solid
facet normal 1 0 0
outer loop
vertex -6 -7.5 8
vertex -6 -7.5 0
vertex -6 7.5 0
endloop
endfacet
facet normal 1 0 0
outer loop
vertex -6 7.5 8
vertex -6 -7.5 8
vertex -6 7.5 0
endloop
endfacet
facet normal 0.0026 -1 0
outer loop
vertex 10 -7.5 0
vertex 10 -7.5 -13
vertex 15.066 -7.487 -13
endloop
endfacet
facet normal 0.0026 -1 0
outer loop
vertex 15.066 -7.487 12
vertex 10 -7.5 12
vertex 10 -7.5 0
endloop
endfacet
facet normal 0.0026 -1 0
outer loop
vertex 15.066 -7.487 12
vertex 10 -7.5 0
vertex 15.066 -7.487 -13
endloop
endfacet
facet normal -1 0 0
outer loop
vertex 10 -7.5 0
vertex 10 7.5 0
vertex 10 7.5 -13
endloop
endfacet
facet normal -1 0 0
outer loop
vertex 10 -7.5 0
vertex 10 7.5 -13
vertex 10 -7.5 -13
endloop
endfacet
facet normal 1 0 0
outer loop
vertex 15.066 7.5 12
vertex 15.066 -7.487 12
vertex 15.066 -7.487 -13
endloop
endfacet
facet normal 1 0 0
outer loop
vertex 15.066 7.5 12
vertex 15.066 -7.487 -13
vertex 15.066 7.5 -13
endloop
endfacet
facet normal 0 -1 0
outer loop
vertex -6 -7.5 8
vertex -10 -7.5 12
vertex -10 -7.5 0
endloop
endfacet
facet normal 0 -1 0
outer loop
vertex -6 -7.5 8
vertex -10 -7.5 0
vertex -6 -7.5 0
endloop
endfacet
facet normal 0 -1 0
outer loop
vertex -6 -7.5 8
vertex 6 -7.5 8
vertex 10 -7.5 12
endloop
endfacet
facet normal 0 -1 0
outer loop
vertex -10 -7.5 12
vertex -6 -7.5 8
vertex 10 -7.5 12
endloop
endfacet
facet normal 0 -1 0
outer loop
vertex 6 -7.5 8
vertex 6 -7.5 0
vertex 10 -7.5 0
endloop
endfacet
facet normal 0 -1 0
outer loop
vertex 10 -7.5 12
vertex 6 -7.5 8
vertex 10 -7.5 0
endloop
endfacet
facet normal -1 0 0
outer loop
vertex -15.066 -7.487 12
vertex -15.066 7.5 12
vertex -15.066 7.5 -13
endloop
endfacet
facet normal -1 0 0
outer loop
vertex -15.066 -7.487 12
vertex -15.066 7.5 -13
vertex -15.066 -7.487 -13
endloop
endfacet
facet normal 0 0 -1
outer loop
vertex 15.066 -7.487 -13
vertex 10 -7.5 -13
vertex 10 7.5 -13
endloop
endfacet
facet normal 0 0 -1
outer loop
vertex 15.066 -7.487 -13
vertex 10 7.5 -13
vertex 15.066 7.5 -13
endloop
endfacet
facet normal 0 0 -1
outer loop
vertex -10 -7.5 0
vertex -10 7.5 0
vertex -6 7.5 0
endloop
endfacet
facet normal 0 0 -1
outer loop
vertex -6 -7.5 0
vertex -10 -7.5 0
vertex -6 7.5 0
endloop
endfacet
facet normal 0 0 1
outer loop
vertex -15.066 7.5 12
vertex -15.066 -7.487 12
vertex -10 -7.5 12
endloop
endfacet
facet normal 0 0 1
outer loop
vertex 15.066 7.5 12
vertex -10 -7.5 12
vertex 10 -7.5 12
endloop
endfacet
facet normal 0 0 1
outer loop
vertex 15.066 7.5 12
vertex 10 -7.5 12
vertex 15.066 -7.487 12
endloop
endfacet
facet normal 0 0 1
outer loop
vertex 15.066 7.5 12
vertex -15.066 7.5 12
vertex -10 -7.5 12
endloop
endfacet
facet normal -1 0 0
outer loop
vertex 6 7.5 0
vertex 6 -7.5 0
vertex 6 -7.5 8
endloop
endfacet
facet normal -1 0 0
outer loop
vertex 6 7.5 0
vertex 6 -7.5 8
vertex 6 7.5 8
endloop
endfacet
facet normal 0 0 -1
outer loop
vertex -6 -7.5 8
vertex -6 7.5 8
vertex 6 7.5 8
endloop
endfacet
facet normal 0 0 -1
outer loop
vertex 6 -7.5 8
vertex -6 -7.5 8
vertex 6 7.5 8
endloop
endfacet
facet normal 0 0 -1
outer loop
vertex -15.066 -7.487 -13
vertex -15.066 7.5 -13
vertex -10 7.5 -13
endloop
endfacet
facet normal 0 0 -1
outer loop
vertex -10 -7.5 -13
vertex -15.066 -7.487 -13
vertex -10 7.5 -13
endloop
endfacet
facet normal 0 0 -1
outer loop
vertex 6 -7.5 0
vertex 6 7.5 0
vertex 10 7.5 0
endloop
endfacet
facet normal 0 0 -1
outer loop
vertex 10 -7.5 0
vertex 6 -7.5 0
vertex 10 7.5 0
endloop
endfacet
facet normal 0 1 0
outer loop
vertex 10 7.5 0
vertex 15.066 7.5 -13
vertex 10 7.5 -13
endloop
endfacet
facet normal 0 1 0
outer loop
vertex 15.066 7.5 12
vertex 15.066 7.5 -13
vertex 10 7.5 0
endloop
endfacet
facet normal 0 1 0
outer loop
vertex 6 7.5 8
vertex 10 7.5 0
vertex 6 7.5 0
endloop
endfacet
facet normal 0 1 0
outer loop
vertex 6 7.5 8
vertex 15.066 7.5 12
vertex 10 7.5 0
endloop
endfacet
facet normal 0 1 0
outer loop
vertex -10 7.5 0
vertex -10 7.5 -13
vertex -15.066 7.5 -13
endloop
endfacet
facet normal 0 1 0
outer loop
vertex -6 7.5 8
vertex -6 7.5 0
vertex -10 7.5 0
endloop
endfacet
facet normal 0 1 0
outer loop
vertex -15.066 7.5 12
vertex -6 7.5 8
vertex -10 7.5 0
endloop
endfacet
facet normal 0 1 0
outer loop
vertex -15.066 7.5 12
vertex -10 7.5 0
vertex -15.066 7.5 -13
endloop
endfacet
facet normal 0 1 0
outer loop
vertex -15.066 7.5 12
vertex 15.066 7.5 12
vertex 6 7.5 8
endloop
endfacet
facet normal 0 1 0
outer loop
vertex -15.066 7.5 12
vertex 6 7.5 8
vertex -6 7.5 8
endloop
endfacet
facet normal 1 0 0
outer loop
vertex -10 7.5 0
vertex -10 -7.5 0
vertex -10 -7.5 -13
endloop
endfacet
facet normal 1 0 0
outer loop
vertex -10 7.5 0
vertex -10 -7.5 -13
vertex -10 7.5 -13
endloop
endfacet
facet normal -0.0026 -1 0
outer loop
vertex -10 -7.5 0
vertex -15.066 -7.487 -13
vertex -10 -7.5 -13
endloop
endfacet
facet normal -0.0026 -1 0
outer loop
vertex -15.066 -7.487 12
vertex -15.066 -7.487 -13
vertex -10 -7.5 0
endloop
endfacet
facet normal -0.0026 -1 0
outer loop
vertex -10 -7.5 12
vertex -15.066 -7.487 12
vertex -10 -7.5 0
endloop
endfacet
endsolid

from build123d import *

# Parameters (mm, degrees)
F0_W     = 4
F0_H     = 15
F0_W_2   = 12
F1_DEPTH = 12
F2_DEPTH = 8
F4_DEPTH = 25


with BuildPart() as f1:
    # F0 (on Top) → F1 (new body)
    with BuildSketch(Plane.XY):
        with Locations((-8, 0)):
            Rectangle(F0_W, F0_H)
        Rectangle(F0_W_2, F0_H)
        with Locations((8, 0)):
            Rectangle(F0_W, F0_H)
    extrude(amount=F1_DEPTH)

    # F0 (on Top) → F2 (cut)
    with BuildSketch(Plane.XY):
        Rectangle(F0_W_2, F0_H)
    extrude(amount=F2_DEPTH, mode=Mode.SUBTRACT)

    # F3 (on face) → F4 (join)
    with BuildSketch(Plane.XY.offset(12)):
        Polygon((-10, -7.5), (-10, 7.5), (-15.066023, 7.5), (-15.066023, -7.486796), align=None)
        Polygon((15.066023, 7.5), (10, 7.5), (10, -7.5), (15.066023, -7.486796), align=None)
    extrude(amount=-F4_DEPTH)


solid = f1.part
